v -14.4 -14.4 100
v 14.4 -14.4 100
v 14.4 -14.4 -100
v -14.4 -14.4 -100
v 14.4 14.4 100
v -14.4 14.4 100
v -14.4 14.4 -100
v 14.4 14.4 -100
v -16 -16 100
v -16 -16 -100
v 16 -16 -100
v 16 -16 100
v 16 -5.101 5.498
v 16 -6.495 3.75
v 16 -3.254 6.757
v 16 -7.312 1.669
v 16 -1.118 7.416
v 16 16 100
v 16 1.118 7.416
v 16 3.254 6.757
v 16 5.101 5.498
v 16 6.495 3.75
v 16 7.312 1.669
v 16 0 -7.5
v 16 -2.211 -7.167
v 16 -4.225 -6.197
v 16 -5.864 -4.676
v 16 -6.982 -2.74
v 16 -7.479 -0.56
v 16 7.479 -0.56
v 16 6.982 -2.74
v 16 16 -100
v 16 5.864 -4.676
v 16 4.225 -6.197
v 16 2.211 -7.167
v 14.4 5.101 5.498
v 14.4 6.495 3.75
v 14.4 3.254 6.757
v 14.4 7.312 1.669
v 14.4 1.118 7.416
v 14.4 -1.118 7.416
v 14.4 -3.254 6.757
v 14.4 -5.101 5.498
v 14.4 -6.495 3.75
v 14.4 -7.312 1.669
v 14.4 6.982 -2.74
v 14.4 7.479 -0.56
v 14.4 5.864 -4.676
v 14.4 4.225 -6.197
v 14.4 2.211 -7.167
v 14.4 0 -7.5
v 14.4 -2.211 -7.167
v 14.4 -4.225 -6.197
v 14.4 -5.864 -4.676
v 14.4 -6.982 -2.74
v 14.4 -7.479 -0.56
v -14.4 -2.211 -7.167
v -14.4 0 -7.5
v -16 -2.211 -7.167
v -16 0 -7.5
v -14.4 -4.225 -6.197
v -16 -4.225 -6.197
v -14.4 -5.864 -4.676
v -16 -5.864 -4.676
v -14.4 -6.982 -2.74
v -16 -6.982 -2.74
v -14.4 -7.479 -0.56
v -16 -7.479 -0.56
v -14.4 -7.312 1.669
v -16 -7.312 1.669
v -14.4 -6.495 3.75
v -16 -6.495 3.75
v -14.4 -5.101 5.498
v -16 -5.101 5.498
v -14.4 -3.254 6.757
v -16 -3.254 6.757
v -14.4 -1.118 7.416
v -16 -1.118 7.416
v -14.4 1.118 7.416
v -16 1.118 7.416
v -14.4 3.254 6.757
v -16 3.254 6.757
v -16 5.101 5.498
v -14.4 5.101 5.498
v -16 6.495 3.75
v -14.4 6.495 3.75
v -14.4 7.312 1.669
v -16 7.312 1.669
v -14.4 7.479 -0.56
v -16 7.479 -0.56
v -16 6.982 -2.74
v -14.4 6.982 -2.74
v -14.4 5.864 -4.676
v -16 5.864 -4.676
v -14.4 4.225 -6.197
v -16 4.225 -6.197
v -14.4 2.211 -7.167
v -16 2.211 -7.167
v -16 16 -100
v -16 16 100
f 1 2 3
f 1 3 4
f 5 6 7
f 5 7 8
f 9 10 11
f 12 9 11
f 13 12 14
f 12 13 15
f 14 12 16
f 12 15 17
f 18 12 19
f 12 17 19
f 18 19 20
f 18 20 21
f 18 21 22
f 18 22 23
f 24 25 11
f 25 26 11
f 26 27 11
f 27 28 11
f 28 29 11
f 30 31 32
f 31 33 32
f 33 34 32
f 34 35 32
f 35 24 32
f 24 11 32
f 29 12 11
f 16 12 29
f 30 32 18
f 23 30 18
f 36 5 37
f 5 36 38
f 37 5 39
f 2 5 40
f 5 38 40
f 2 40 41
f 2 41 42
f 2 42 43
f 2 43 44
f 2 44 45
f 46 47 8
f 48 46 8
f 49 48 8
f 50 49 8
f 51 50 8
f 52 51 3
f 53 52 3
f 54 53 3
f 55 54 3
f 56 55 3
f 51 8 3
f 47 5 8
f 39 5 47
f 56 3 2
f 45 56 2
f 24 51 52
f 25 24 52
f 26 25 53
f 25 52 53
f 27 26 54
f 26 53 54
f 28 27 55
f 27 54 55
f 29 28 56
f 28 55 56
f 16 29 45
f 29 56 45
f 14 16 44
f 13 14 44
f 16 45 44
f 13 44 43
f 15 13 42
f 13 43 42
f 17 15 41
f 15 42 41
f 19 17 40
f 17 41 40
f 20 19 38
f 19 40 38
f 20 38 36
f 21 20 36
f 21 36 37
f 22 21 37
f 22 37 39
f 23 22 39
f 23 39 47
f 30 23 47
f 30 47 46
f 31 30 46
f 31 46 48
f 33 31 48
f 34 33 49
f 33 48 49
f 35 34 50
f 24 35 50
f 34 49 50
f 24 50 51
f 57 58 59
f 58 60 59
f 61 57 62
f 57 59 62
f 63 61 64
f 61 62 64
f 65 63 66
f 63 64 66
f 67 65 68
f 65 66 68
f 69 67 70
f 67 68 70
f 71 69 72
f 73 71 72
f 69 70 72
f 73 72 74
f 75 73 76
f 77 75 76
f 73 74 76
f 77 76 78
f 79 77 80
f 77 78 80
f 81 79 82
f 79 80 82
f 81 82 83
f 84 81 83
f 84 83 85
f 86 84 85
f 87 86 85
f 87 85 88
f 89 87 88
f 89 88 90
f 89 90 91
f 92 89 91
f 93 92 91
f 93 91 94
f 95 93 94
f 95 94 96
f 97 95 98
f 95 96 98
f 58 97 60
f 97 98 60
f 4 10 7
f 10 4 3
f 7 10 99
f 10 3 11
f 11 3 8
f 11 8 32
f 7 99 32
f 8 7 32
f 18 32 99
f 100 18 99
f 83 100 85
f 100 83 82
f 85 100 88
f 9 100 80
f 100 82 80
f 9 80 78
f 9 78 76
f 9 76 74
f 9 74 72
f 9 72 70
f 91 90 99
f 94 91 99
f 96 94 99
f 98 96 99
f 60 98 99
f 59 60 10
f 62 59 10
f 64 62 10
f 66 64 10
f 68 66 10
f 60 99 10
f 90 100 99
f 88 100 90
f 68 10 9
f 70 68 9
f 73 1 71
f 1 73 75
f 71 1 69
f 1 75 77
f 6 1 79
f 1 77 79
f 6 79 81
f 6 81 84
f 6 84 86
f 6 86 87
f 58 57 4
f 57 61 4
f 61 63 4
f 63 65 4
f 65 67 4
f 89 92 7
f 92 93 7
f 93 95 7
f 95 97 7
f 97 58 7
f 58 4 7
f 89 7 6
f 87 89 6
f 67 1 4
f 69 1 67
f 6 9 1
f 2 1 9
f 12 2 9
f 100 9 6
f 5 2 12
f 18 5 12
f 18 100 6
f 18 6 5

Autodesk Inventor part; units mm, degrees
ref_plane "YZ Plane" through (0, 0, 0) normal (1, 0, 0) x (0, 1, 0)
ref_plane "XZ Plane" through (0, 0, 0) normal (0, 1, 0) x (-1, 0, 0)
sketch "スケッチ1" plane through (0, 0, 0) normal (0, 0, 1) x (1, 0, 0)
  line L0 (-16, -16) -> (16, -16)
  line L1 (16, -16) -> (16, 16)
  line L2 (16, 16) -> (-16, 16)
  line L3 (-16, 16) -> (-16, -16)
  line L4 (-16, -16) -> (16, 16) construction
  line L5 (16, -16) -> (-16, 16) construction
  line L6 (-14.4, 14.4) -> (14.4, 14.4)
  line L7 (14.4, 14.4) -> (14.4, -14.4)
  line L8 (14.4, -14.4) -> (-14.4, -14.4)
  line L9 (-14.4, -14.4) -> (-14.4, 14.4)
  point P0 (0, 0)
  dimension "d0" = 32
  dimension "d1" = 32
  dimension "d2" = 1.6
extrude "押し出し1" add sketch "スケッチ1" along normal mid plane 200
ref_plane "作業平面1" through (16, -16, 100) normal (1, 0, 0) x (0, 0, -1)
sketch "スケッチ2" plane through (16, -16, 100) normal (1, 0, 0) x (0, 0, -1)
  point P0 (100, 16)
  point P1 (100, 16)
hole "穴1" at (16, 0, 0) direction (-1, 0, 0) diameter 15 end through all
properties part number "Pipe横"
